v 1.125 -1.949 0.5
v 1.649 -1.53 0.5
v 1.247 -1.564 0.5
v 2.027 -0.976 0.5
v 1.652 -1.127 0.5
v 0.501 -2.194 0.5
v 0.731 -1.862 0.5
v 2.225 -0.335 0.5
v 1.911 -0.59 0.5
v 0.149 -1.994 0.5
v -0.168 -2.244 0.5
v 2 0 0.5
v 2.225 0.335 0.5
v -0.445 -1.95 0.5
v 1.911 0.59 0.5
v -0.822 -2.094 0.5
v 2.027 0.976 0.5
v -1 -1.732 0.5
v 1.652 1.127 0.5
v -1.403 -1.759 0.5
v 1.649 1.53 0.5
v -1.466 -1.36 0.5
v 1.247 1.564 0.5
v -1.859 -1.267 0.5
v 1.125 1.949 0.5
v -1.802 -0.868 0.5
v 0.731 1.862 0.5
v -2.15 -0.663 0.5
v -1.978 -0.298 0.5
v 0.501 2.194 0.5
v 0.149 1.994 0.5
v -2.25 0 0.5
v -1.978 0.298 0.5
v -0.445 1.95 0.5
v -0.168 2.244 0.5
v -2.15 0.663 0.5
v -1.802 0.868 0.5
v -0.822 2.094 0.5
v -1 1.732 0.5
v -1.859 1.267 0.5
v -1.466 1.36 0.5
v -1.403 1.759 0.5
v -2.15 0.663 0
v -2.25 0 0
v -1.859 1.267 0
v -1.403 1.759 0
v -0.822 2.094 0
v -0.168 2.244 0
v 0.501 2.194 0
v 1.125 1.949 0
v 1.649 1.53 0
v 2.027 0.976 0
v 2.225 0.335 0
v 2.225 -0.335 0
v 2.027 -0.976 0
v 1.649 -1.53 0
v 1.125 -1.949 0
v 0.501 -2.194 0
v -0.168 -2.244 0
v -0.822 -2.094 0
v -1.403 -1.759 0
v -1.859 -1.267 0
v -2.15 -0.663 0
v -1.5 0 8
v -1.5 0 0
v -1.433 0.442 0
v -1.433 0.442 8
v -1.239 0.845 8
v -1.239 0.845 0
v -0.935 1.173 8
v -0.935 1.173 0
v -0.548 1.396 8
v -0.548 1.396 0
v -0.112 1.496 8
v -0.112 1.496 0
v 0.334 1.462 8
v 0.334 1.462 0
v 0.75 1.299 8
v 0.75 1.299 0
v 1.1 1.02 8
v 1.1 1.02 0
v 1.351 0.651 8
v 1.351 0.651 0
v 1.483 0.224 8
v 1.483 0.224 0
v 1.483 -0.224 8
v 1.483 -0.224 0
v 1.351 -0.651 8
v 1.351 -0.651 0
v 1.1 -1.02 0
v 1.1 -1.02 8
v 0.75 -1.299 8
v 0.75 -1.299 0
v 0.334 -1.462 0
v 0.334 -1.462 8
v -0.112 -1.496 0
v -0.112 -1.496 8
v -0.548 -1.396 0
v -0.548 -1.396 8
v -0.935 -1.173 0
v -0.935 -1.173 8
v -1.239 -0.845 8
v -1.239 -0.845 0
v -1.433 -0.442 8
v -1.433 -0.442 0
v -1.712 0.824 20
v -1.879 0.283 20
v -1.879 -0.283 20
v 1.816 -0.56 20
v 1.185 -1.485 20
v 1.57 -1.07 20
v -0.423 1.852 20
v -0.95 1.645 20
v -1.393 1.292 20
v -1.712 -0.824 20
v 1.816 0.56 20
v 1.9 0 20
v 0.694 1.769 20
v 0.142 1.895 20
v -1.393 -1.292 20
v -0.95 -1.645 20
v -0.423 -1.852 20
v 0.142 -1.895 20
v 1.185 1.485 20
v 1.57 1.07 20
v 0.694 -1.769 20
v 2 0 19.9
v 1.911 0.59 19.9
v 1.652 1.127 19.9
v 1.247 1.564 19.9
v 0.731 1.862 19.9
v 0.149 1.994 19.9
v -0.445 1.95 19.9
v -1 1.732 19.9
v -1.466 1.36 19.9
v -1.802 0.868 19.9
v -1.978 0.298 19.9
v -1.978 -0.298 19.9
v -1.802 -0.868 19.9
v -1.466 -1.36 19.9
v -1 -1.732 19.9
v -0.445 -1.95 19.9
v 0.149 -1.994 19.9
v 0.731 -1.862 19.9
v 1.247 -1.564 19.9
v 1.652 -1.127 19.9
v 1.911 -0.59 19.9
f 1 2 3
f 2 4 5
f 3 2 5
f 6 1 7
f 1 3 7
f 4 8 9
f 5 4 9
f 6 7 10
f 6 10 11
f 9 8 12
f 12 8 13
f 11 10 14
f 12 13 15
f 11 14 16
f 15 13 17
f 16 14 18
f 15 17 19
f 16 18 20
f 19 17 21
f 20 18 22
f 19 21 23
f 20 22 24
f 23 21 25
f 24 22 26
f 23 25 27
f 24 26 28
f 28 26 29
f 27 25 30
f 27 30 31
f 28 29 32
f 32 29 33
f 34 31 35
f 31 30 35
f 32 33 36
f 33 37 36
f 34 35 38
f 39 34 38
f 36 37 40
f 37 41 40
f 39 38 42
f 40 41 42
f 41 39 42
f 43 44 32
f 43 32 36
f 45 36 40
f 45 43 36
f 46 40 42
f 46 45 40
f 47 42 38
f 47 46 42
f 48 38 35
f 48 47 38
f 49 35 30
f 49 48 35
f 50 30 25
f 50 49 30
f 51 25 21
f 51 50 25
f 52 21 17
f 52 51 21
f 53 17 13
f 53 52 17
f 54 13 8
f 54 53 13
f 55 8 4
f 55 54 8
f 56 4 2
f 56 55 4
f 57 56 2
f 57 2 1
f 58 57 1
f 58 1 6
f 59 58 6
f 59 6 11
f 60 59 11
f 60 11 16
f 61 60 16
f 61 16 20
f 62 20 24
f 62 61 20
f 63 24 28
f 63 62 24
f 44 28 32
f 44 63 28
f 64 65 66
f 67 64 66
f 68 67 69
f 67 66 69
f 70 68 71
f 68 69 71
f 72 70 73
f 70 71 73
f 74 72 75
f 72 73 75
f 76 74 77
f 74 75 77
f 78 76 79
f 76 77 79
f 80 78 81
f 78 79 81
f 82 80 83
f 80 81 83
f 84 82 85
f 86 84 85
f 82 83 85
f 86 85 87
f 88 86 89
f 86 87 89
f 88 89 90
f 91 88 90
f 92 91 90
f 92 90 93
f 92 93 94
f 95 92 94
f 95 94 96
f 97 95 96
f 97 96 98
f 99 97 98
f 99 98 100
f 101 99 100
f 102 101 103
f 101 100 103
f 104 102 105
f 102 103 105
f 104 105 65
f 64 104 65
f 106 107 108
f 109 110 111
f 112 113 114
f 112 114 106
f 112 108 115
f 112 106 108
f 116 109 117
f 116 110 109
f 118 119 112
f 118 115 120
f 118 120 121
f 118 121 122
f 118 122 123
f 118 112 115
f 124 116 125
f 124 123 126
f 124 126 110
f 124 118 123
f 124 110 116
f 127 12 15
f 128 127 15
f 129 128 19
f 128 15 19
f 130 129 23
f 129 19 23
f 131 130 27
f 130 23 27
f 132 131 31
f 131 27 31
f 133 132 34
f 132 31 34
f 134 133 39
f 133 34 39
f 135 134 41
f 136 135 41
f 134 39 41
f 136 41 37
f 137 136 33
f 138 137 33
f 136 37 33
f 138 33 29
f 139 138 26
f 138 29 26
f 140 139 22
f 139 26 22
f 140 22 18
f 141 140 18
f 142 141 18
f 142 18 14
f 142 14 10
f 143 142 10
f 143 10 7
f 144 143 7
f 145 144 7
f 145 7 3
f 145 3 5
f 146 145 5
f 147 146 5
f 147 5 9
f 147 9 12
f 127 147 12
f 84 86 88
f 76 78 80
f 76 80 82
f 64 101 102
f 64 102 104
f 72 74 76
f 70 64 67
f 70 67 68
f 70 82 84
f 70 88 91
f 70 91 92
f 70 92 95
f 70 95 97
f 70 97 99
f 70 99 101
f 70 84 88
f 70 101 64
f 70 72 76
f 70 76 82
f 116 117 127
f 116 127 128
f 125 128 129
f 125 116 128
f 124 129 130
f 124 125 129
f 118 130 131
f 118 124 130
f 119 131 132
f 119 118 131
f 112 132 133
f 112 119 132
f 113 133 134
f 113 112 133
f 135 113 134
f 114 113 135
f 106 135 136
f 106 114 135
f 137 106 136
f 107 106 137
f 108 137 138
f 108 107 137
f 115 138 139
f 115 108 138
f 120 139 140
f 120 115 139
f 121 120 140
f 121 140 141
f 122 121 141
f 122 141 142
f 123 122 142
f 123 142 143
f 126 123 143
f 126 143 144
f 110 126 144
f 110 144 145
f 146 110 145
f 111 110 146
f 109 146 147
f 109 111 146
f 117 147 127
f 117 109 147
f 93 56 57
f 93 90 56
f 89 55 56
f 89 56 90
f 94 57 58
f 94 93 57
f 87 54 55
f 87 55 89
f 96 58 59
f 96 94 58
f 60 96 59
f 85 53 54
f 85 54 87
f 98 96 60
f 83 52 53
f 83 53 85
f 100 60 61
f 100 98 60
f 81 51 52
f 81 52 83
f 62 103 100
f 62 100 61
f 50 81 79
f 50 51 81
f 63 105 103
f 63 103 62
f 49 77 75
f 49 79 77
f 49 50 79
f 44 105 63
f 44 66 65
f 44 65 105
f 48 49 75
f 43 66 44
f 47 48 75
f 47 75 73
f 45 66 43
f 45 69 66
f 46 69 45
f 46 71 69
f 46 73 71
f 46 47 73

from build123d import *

# Parameters (mm, degrees)
SKETCH_1_R          = 2
EXTRUDE_1_DEPTH     = 20
SKETCH_2_R          = 2.25
EXTRUDE_2_DEPTH     = 0.5
SKETCH_3_R          = 1.5
CUT_EXTRUDE_1_DEPTH = 8
CHAMFER_1_SIZE      = 0.1


with BuildPart() as part:
    # 草图1 → 凸台-拉伸1 (new body)
    with BuildSketch(Plane.XY):
        Circle(SKETCH_1_R)
    extrude(amount=EXTRUDE_1_DEPTH)

    # 草图2 → 凸台-拉伸2 (add)
    with BuildSketch(Plane(origin=(0, 0, 0), x_dir=(-1, 0, 0), z_dir=(0, 0, -1))):
        Circle(SKETCH_2_R)
    extrude(amount=-EXTRUDE_2_DEPTH)

    # 草图3 → 切除-拉伸1 (cut)
    with BuildSketch(Plane(origin=(0, 0, 0), x_dir=(-1, 0, 0), z_dir=(0, 0, -1))):
        Circle(SKETCH_3_R)
    extrude(amount=-CUT_EXTRUDE_1_DEPTH, mode=Mode.SUBTRACT)

    # 倒角1
    chamfer_1_edges = [part.edges().sort_by_distance(p)[0] for p in [
        (-2, 0, 20),
    ]]
    chamfer(chamfer_1_edges, length=CHAMFER_1_SIZE)


solid = part.part
